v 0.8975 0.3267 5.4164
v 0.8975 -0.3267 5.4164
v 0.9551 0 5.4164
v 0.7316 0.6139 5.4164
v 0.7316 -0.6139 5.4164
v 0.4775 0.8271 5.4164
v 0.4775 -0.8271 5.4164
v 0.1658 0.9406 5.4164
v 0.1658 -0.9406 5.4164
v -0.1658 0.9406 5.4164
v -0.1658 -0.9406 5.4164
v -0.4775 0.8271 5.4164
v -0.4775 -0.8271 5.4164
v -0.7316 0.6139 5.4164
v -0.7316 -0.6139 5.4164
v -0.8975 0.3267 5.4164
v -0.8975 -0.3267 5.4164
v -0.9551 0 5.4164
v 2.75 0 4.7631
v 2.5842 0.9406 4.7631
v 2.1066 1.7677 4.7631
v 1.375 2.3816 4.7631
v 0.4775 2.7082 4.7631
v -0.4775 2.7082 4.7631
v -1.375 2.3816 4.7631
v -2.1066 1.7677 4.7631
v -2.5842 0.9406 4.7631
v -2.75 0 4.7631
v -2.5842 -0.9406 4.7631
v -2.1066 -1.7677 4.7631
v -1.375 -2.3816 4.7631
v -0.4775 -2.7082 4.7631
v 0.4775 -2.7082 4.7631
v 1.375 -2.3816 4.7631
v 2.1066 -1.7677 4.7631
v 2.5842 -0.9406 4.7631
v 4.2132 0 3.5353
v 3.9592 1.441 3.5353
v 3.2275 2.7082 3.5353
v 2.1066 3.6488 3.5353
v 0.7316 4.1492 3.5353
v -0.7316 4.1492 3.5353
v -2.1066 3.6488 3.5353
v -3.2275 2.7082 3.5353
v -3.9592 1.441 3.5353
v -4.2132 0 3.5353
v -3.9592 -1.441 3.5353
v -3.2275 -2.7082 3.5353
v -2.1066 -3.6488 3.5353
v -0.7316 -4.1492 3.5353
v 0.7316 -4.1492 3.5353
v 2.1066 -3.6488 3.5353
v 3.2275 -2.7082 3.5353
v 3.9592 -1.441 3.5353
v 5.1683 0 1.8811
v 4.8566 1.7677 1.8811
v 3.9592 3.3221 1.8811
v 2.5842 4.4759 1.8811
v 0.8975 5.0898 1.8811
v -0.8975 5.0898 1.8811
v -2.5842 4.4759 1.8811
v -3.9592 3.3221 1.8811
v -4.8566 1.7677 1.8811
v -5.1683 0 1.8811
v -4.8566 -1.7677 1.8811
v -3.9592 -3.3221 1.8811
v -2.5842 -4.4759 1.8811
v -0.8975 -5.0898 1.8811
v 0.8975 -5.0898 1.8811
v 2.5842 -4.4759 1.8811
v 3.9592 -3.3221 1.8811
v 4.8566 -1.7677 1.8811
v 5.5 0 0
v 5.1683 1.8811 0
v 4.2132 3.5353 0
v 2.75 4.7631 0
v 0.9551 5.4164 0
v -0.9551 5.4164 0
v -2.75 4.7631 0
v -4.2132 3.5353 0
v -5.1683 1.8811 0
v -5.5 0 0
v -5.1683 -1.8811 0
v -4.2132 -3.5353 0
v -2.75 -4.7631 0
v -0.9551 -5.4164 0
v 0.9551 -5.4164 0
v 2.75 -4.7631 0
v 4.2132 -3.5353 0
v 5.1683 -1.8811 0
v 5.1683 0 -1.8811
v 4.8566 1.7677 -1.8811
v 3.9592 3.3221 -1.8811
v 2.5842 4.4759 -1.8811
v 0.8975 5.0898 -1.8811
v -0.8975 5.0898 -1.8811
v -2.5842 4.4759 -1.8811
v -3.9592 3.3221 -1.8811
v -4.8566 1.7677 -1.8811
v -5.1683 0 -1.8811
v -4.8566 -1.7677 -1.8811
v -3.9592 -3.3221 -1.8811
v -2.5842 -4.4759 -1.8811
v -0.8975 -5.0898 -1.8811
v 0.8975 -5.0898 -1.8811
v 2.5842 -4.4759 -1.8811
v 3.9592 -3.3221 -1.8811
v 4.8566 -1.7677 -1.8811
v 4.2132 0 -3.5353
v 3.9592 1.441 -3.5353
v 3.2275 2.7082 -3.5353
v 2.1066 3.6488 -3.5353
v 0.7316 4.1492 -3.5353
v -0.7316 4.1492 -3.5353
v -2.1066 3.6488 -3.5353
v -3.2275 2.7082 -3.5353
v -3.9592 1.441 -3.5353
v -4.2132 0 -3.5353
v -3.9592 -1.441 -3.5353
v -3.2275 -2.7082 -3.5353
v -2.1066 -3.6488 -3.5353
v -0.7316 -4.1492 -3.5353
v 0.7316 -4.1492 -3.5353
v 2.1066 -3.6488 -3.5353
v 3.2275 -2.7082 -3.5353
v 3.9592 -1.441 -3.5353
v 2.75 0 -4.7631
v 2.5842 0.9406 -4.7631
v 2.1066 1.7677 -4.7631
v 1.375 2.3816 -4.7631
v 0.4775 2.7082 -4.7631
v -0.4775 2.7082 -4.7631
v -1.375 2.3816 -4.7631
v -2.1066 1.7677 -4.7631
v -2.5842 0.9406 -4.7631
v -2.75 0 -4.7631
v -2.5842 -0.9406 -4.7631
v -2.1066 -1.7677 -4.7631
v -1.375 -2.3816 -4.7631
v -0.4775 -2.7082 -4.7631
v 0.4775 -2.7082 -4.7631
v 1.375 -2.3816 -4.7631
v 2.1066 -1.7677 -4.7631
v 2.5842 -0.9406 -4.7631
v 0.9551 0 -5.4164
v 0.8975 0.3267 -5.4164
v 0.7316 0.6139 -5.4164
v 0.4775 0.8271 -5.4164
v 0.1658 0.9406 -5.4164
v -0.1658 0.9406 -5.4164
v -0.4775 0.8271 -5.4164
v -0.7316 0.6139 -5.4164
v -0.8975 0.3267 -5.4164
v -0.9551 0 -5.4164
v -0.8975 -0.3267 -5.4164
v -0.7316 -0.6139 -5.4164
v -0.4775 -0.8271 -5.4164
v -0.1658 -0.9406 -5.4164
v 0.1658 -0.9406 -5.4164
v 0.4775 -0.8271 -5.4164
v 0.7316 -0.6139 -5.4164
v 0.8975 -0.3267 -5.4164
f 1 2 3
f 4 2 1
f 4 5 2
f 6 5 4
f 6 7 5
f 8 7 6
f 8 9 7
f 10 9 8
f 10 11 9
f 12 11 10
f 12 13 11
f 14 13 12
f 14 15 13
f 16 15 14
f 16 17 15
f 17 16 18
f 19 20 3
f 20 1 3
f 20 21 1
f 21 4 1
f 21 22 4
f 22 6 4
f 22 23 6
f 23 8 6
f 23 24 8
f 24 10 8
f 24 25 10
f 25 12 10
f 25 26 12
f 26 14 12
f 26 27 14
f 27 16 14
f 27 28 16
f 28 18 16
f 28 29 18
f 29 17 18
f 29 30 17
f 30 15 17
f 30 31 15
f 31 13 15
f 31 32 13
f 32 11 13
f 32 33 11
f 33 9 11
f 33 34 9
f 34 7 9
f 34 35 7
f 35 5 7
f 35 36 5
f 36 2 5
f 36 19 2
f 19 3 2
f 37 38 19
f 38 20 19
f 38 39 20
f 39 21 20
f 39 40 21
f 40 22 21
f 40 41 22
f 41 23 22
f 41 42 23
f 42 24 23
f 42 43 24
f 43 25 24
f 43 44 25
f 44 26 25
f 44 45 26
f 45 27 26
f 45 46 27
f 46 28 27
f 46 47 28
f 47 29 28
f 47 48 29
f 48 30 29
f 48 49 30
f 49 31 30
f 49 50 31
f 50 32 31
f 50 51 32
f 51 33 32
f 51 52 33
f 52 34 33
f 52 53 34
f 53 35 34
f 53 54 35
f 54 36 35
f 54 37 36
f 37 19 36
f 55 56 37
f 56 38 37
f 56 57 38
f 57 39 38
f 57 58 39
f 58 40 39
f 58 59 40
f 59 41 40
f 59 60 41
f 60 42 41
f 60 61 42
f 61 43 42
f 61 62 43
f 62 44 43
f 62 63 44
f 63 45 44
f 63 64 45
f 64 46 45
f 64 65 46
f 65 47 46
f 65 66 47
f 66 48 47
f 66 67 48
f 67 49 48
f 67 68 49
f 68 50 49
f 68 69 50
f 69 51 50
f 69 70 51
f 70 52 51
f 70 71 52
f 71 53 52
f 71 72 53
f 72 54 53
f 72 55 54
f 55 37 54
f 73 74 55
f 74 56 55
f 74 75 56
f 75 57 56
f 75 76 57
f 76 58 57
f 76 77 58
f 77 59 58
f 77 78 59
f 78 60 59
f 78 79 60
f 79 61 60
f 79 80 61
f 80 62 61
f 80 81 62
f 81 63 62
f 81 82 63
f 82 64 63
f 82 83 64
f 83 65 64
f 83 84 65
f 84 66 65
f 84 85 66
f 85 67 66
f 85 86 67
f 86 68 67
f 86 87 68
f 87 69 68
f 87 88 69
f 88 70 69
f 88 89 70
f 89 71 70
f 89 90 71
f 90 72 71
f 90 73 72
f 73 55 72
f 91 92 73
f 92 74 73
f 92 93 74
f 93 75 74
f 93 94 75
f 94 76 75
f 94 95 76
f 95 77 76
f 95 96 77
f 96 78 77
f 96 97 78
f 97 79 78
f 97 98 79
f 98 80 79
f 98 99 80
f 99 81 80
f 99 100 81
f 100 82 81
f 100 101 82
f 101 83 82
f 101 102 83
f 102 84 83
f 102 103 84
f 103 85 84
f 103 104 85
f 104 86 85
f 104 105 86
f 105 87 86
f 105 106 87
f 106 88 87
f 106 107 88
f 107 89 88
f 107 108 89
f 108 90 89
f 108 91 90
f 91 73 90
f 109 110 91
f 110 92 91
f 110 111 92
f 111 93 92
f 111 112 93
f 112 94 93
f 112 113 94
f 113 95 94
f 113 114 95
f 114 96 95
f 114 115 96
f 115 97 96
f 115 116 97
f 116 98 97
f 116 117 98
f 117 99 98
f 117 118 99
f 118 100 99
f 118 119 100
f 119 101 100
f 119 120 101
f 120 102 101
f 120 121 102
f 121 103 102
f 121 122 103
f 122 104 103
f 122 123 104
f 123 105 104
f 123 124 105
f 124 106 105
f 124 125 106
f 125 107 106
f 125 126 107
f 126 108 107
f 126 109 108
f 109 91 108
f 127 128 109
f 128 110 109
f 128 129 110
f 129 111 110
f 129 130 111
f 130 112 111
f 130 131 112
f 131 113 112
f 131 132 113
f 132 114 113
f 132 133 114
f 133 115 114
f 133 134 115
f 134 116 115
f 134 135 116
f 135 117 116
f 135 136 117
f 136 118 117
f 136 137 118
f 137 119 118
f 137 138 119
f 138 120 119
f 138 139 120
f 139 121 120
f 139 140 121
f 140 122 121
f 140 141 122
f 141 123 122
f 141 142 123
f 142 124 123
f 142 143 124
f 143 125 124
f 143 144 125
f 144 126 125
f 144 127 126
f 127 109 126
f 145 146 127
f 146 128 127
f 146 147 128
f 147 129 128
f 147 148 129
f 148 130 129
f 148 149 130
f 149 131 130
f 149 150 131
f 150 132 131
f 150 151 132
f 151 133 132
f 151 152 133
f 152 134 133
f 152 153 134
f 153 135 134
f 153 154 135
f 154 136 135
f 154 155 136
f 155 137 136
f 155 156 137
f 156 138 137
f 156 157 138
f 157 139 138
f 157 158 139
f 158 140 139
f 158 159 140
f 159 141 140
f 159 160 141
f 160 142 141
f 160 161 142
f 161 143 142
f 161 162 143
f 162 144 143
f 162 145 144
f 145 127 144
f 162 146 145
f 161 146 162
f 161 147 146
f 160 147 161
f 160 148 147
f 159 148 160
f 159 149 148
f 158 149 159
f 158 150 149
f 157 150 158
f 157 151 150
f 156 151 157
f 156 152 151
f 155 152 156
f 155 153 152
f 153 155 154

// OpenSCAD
// Generated by SolidPython 1.0.1 on 2020-07-29 00:02:42


sphere(d = 11, r = 3);
/***********************************************
*********      SolidPython code:      **********
************************************************
 
# import packages: SolidPython
from solid import *
from solid.utils import *
from itertools import chain, combinations


class Resize:

    def __init__(self, scad_file):
        self.scad_file = scad_file
        #self.scad_file = import_scad(scad_file)
        # cone/cylinder param:
        self.r1 = 0
        self.r2 = 0
        self.h = 0
        # rectangular prism param:
        self.w = 0
        self.l = 0
        # ellipse param:
        self.r = 0

    # import OpenScad code (file name corresponds to shape)


    # classify shape + parameters
    def assign(self, param1, param2, param3):
        if self.scad_file == 'cone.scad':
            self.r1 = param1
            self.r2 = param2
            self.h = param3
        elif self.scad_file == 'cylinder.scad':
            self.r1 = param1
            self.r2 = param2
            self.h = param3
        elif self.scad_file == 'rectangularPrism.scad':
            self.h = param1
            self.l = param2
            self.w = param3
        else:
            self.r = param1
            self.h = param2

    # resize parameters
    def iterate(self):
        x = range(3, 20, 2)
        i = 1
        if self.scad_file == 'cone.scad':
            tempList = list(combinations(x, 3))
            #print(tempList)
            for i in x:
                for j in range (3):
                    param1 = tempList[i][0]
                    param2 = tempList[i][1]
                    param3 = tempList[i][2]
                    filepath = 'produced_scad_files/' + 'cone' + str(param1) + '_' + str(param2) + '_' + str(param3) + '.scad'
                    scad_render_to_file(cylinder(h=param1, r1=param2, r2=param3), filepath)

        elif self.scad_file == 'cylinder.scad':
            tempList = list(combinations(x, 3))
            for i in x:
                for j in range(3):
                    param1 = tempList[i][0]
                    param2 = tempList[i][1]
                    param3 = tempList[i][2]
                    filepath = 'produced_scad_files/' + 'cylinder' + str(param1) + '_' + str(param2) + '_' + str(param3) + '.scad'
                    scad_render_to_file(cylinder(h=param1, r1=param2, r2=param3), filepath)

        elif self.scad_file == 'rectangularPrism.scad':
            tempList = list(combinations(x, 3))
            for i in x:
                for j in range(3):
                    param1 = tempList[i][0]
                    param2 = tempList[i][1]
                    param3 = tempList[i][2]
                    filepath = 'produced_scad_files/' + 'rectangularPrism' + str(param1) + '_' + str(param2) + '_' + str(
                        param3) + '.scad'
                    scad_render_to_file(cube(size=(param1, param2, param3)), filepath)

        else:
            tempList = list(combinations(x, 2))
            for i in x:
                for j in range(3):
                    param1 = tempList[i][0]
                    param2 = tempList[i][1]
                    filepath = 'produced_scad_files/' + 'ellipse' + str(param1) + '_' + str(param2) + '_' + '.scad'
                    scad_render_to_file(sphere(param1, param2), filepath)

    def render_to_scadfile(self):
        scad_render_to_file(scad, 'example.scad') 
 
************************************************/
